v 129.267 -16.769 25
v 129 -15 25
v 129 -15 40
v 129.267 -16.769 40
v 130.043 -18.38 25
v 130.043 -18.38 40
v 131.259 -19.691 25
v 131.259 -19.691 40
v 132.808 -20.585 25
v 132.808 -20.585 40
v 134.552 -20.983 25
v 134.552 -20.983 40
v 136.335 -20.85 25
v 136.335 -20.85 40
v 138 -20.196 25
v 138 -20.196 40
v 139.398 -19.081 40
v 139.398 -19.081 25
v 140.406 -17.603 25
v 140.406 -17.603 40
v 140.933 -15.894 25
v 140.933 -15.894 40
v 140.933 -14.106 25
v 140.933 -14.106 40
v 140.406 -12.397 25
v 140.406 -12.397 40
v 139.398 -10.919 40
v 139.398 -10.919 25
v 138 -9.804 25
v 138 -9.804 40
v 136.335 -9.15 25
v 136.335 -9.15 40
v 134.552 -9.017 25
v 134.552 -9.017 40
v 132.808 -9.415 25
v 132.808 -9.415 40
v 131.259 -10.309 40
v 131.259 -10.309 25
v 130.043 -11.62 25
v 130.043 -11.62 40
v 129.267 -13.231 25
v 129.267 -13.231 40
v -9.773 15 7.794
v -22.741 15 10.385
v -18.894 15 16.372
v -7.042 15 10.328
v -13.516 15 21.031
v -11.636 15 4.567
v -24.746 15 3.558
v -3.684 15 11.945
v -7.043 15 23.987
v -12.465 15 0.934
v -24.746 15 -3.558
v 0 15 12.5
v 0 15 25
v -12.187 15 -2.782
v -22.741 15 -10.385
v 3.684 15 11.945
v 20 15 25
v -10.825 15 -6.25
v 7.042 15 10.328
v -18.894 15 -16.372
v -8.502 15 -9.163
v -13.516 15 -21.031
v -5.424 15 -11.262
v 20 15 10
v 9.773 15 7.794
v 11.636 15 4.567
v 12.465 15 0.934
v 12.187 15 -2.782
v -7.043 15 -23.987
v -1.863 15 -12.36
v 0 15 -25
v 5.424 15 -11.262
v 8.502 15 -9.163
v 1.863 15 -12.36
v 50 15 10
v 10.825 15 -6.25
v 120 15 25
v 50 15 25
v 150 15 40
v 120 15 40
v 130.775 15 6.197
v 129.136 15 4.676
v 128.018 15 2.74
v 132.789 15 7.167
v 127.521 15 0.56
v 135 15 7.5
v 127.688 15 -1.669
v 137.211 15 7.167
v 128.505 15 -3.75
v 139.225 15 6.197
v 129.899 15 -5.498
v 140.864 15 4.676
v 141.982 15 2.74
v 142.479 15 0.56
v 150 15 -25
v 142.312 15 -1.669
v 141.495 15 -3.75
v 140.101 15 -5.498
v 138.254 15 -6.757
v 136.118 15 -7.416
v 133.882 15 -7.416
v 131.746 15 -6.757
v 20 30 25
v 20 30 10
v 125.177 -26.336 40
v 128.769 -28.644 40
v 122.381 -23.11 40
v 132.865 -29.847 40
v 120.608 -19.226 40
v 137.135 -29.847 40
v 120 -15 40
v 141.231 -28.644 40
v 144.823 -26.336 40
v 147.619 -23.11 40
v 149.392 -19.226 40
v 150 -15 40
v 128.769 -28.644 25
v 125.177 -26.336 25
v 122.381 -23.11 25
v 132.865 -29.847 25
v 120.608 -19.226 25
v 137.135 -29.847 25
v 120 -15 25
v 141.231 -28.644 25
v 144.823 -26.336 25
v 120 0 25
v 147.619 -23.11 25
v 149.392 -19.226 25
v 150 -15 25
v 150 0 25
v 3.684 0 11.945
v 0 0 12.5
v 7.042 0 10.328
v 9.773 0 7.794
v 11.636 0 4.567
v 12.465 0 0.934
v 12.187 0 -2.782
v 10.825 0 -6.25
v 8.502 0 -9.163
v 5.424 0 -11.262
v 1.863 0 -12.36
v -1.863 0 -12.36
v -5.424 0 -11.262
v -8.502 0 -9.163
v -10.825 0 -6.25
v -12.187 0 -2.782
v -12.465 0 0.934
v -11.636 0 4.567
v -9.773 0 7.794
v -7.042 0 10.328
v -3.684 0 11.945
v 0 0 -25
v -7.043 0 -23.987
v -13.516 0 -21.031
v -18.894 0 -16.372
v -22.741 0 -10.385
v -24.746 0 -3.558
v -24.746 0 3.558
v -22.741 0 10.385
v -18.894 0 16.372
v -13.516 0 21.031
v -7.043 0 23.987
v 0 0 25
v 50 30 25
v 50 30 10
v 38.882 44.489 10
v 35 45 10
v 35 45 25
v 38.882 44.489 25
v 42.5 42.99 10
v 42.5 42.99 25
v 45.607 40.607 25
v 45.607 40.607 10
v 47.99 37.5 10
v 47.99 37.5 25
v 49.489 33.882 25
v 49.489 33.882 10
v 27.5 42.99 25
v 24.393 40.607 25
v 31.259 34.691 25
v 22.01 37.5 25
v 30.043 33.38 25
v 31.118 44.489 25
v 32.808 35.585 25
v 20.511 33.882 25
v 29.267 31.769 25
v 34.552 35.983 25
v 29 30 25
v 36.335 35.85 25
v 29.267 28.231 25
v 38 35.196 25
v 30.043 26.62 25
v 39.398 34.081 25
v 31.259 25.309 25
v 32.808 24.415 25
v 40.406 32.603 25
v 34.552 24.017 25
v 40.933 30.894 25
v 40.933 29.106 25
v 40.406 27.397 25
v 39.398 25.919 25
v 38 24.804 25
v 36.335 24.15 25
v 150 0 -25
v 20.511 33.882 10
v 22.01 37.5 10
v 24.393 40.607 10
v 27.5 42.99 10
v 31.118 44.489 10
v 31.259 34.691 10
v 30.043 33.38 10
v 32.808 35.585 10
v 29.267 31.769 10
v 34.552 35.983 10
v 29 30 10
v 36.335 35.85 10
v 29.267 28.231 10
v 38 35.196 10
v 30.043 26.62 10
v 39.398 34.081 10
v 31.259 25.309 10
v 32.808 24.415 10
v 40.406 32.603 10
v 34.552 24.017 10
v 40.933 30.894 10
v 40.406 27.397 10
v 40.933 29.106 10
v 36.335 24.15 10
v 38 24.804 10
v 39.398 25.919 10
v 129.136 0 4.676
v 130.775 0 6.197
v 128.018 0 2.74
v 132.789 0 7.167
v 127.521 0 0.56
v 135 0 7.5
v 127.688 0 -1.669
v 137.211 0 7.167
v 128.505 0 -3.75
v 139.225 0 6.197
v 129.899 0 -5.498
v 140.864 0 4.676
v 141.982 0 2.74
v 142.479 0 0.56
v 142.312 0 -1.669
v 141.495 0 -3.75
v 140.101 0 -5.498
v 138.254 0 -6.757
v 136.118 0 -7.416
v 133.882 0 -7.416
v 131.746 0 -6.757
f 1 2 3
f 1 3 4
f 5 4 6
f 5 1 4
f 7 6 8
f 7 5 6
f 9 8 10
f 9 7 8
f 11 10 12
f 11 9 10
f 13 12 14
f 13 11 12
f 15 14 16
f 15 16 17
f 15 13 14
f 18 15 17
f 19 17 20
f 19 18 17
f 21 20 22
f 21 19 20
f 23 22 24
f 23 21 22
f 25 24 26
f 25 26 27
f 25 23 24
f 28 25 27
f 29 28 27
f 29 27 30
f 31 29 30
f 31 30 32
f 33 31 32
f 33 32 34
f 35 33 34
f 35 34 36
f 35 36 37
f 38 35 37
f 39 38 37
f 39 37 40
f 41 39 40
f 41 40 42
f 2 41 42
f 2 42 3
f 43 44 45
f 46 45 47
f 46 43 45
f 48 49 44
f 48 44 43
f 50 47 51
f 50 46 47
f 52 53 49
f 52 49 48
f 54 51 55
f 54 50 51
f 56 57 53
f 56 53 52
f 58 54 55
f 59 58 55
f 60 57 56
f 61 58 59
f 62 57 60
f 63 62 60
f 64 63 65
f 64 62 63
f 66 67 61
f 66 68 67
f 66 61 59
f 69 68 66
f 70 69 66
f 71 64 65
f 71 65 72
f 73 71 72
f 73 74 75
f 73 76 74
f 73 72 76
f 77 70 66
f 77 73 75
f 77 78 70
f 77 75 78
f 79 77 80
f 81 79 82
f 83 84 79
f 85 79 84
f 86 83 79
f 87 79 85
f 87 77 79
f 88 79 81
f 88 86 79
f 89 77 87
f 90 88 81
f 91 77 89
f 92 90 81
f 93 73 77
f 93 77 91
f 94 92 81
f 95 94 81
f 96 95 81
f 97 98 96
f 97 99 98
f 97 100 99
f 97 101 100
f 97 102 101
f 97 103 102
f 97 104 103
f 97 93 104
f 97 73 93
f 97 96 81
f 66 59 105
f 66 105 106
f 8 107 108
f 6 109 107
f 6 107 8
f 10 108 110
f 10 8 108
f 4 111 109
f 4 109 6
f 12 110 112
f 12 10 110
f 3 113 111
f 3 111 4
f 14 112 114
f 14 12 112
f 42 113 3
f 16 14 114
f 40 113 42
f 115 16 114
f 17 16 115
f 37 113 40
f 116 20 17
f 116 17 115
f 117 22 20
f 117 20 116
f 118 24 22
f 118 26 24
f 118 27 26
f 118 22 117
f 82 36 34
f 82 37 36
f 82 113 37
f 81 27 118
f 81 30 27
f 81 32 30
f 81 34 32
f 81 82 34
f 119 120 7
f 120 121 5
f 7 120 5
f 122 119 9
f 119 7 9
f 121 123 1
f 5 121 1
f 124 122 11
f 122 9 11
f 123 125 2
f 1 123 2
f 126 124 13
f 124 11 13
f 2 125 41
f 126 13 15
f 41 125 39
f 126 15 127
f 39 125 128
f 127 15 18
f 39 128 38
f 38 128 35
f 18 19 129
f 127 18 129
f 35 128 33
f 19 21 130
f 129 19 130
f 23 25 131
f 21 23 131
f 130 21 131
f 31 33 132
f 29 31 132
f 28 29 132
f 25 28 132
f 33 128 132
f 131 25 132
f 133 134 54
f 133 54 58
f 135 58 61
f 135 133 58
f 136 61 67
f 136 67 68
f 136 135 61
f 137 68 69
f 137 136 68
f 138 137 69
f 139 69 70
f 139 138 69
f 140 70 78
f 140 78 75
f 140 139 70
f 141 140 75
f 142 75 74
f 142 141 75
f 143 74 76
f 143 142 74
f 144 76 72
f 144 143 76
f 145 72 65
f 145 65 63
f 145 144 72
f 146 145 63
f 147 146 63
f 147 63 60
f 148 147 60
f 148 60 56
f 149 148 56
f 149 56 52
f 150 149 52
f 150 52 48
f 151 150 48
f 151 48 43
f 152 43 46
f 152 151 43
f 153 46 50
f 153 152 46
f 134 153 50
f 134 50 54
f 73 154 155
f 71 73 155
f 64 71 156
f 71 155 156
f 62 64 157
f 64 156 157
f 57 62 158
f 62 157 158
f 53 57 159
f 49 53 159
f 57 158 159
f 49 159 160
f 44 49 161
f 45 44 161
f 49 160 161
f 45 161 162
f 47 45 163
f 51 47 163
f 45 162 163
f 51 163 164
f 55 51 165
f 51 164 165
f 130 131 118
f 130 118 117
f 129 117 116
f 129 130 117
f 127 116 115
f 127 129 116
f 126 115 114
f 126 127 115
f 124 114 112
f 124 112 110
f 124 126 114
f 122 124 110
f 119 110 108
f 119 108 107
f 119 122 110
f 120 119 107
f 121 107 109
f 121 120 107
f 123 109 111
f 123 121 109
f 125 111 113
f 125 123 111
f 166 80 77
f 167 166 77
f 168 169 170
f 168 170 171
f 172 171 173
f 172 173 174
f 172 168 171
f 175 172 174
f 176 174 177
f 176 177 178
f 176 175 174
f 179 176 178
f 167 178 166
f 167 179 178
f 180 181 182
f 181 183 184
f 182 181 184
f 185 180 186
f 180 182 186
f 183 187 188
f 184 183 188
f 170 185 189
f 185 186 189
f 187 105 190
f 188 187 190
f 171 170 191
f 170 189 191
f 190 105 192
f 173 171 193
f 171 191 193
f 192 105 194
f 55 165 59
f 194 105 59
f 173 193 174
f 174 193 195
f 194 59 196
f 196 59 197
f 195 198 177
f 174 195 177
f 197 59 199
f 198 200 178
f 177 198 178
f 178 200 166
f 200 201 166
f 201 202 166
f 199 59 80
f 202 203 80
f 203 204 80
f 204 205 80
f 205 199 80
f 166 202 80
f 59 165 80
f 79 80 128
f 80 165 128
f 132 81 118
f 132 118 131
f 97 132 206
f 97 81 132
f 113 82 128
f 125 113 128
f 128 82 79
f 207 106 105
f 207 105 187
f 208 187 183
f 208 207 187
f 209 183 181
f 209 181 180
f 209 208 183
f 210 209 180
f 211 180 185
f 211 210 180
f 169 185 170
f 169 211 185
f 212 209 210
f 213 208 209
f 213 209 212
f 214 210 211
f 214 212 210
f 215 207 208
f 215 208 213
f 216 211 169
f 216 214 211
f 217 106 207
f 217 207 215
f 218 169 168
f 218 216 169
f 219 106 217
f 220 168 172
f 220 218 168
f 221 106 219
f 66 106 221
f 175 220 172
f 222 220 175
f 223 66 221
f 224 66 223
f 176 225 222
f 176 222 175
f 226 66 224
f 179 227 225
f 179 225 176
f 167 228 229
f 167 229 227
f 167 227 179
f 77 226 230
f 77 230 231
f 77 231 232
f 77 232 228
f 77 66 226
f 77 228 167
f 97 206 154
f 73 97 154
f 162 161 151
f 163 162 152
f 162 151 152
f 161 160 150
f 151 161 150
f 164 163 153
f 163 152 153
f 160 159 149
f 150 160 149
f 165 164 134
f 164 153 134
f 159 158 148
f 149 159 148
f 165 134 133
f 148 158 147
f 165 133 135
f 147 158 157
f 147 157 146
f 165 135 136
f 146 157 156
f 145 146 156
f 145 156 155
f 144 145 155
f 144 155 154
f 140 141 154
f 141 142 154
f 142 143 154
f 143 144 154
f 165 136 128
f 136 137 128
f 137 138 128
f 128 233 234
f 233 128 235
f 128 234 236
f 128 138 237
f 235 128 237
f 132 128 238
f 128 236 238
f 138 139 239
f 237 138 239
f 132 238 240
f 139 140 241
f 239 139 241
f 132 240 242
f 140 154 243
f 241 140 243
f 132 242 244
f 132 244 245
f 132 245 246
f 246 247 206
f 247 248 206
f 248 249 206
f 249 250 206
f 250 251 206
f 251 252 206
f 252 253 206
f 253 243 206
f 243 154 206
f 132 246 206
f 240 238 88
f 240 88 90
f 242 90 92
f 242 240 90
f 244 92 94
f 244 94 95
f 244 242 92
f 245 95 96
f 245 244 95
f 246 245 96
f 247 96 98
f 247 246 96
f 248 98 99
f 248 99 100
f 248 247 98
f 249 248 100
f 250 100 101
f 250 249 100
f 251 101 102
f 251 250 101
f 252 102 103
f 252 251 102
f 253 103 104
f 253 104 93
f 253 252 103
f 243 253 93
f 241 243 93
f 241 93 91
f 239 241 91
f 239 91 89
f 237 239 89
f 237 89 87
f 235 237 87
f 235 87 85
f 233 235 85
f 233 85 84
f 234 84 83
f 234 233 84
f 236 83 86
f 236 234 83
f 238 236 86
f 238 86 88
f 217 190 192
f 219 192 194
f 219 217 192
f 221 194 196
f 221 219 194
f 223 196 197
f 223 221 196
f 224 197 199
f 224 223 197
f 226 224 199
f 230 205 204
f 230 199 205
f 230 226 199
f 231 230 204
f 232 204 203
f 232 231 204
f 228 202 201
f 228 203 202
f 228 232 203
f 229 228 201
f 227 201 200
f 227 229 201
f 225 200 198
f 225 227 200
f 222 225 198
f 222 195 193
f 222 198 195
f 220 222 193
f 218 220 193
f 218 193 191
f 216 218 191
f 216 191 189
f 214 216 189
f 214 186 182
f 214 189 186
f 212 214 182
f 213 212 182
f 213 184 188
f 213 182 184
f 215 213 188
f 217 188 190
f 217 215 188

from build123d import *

# Parameters (mm, degrees)
SKETCH1_R           = 12.5
SKETCH1_R_2         = 7.5
BOSS_EXTRUDE1_DEPTH = 15
SKETCH1_3_W         = 30
SKETCH1_3_H         = 15
BOSS_EXTRUDE2_DEPTH = 45
BOSS_EXTRUDE3_START = 15
SKETCH1_4_W         = 30
SKETCH1_4_H         = 15
BOSS_EXTRUDE3_DEPTH = 45
CUT_EXTRUDE1_START  = 10
SKETCH3_R           = 6
CUT_EXTRUDE1_DEPTH  = 30


with BuildPart() as part:
    # Sketch1 → Boss-Extrude1 (new body)
    with BuildSketch(Plane(origin=(0, 0, 0), x_dir=(1, 0, 0), z_dir=(0, 1, 0))):
        with BuildLine():
            Line((150, 25), (0, 25))
            ThreePointArc((0, 25), (-25, 0), (0, -25))
            Line((0, -25), (20, -25))
            Line((20, -25), (20, -10))
            Line((20, -10), (50, -10))
            Line((50, -10), (50, -25))
            Line((50, -25), (120, -25))
            Line((120, -25), (150, -25))
            Line((150, -25), (150, 25))
        make_face()
        with Locations(Location((0, 0, 0), (0, 0, 270))):
            Circle(SKETCH1_R, mode=Mode.SUBTRACT)
        with Locations(Location((135, 0, 0), (0, 0, 270))):
            Circle(SKETCH1_R_2, mode=Mode.SUBTRACT)
    extrude(amount=BOSS_EXTRUDE1_DEPTH)

    # Sketch1<3> → Boss-Extrude2 (add)
    with BuildSketch(Plane(origin=(0, 0, 0), x_dir=(1, 0, 0), z_dir=(0, 1, 0))):
        with Locations((35, -17.5)):
            Rectangle(SKETCH1_3_W, SKETCH1_3_H)
    extrude(amount=BOSS_EXTRUDE2_DEPTH)

    # Sketch1<4> → Boss-Extrude3 (add)
    with BuildSketch(Plane(origin=(0, 0, 0), x_dir=(1, 0, 0), z_dir=(0, 1, 0)).offset(BOSS_EXTRUDE3_START)):
        with Locations((135, -32.5)):
            Rectangle(SKETCH1_4_W, SKETCH1_4_H)
    extrude(amount=-BOSS_EXTRUDE3_DEPTH)

    # Sketch3 → Cut-Extrude1 (cut)
    with BuildSketch(Plane.XY.offset(CUT_EXTRUDE1_START)):
        with BuildLine():
            ThreePointArc((35, 45), (45.606601718, 40.606601718), (50, 30))
            Line((50, 30), (50, 45))
            Line((50, 45), (35, 45))
        make_face()
        with BuildLine():
            Line((20, 45), (20, 30))
            ThreePointArc((20, 30), (24.393398282, 40.606601718), (35, 45))
            Line((35, 45), (20, 45))
        make_face()
        with Locations(Location((35, 30, 0), (0, 0, 180))):
            Circle(SKETCH3_R)
        with BuildLine():
            ThreePointArc((150, -15), (135, -30), (120, -15))
            Line((120, -15), (120, -39.427079815))
            Line((120, -39.427079815), (150, -39.427079815))
            Line((150, -39.427079815), (150, -15))
        make_face()
        with Locations(Location((135, -15, 0), (0, 0, 180))):
            Circle(SKETCH3_R)
    extrude(amount=CUT_EXTRUDE1_DEPTH, mode=Mode.SUBTRACT)


solid = part.part
